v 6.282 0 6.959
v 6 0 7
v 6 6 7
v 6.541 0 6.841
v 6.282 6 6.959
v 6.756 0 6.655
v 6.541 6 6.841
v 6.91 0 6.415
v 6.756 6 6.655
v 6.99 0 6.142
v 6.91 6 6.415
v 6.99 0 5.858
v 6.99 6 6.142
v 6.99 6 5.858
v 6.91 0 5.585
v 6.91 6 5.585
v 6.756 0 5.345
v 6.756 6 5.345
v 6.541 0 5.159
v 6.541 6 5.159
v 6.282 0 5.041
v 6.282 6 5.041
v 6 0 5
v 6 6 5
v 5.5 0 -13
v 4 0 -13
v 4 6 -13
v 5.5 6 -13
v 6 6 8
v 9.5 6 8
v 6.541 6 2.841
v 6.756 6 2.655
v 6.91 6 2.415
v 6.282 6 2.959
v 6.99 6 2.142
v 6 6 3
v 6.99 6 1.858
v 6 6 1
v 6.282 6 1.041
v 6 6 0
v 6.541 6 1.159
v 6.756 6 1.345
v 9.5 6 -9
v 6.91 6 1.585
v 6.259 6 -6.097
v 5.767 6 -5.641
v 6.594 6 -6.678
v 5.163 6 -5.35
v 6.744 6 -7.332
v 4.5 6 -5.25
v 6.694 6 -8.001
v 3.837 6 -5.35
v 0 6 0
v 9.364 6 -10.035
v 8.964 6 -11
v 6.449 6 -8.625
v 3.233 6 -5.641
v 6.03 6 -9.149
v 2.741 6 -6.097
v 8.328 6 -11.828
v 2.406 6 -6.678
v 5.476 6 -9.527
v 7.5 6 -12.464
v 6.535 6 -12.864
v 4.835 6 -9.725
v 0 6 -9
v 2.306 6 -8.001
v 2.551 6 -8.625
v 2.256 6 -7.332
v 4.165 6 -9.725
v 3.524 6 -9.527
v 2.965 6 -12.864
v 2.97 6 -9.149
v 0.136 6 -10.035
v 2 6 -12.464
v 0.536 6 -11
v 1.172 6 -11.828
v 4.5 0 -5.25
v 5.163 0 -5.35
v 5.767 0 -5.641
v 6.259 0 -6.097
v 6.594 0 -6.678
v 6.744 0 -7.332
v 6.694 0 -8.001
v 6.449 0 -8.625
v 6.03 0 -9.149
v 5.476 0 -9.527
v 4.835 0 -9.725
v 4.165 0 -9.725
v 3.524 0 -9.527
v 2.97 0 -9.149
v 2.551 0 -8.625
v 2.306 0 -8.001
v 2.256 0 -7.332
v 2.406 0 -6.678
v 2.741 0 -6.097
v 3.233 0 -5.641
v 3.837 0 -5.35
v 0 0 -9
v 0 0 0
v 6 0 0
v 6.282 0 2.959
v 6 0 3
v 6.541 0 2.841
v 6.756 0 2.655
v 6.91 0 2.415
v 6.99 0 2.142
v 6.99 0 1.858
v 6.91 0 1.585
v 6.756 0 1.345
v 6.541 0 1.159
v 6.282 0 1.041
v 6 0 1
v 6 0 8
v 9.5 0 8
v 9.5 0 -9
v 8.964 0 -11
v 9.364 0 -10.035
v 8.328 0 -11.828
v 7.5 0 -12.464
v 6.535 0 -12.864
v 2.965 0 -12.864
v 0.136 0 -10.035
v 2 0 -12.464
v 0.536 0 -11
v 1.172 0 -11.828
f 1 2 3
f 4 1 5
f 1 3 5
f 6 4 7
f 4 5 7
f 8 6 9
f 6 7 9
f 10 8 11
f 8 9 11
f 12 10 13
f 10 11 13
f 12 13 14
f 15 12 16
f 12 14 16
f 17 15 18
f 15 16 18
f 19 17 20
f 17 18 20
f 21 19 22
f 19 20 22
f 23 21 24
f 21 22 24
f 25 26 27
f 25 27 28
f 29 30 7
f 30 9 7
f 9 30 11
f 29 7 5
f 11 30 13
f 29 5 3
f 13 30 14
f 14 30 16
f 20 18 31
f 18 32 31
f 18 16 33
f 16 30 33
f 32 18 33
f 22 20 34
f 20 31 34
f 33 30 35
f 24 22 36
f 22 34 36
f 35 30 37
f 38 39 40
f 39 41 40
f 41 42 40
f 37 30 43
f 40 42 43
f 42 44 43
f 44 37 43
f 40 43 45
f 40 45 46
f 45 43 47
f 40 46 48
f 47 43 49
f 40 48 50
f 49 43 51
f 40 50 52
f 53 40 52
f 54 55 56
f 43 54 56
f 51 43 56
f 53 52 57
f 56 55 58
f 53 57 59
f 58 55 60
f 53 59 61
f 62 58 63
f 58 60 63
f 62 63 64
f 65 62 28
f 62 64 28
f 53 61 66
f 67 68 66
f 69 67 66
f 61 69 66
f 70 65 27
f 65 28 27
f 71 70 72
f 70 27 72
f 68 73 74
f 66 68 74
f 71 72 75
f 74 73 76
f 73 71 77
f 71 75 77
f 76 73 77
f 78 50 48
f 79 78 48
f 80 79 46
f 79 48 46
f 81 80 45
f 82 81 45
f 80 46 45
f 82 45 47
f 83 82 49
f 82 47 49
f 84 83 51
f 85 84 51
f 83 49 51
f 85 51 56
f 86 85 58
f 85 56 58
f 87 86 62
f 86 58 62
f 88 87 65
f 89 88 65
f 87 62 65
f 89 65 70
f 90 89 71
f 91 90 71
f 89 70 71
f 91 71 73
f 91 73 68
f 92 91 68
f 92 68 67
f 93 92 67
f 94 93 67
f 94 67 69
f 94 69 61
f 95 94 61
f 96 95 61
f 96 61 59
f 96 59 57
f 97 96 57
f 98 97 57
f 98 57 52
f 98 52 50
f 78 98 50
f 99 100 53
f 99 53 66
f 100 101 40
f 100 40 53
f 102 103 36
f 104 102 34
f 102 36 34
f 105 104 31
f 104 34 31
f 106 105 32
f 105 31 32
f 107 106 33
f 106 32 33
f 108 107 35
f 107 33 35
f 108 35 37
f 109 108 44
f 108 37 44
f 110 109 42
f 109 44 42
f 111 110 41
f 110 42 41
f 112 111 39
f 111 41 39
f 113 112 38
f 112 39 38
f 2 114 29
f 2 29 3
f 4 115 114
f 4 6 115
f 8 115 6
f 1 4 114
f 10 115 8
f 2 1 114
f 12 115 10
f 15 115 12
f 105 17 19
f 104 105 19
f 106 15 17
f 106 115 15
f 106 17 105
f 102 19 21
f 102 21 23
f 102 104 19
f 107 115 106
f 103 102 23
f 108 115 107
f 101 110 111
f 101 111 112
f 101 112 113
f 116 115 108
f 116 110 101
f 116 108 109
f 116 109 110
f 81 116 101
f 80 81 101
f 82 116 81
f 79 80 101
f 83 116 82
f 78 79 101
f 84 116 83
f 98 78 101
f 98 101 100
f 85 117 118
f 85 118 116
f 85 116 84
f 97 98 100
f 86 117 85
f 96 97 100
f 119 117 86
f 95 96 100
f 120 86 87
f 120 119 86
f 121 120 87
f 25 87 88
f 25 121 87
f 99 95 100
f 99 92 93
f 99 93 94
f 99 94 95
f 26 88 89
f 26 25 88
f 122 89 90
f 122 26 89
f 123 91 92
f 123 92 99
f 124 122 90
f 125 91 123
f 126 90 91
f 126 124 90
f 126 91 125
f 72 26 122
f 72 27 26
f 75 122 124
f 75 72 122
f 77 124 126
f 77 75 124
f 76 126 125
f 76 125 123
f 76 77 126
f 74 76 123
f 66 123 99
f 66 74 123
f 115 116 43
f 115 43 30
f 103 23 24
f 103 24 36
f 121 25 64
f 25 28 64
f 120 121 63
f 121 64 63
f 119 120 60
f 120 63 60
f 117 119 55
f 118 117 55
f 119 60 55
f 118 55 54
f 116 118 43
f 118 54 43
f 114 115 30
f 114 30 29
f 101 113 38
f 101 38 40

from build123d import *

# Parameters (mm, degrees)
BOSS_EXTRUDE1_DEPTH = 6
SKETCH2_R           = 1
SKETCH2_R_2         = 2.25
CUT_EXTRUDE1_DEPTH  = 18.182840277
FILLET1_R           = 4


with BuildPart() as part:
    # Sketch1 → Boss-Extrude1 (new body)
    with BuildSketch(Plane(origin=(0, 0, 0), x_dir=(1, 0, 0), z_dir=(0, 1, 0))):
        Polygon((0, 13), (9.5, 13), (9.5, -8), (6, -8), (6, 0), (0, 0), align=None)
    extrude(amount=BOSS_EXTRUDE1_DEPTH)

    # Sketch2 → Cut-Extrude1 (cut, through all)
    with BuildSketch(Plane(origin=(0, 6, 0), x_dir=(1, 0, 0), z_dir=(0, 1, 0))):
        with Locations((6, -2)):
            Circle(SKETCH2_R)
        with Locations(Location((4.5, 7.5, 0), (0, 0, 270))):
            Circle(SKETCH2_R_2)
        with Locations((6, -6)):
            Circle(SKETCH2_R)
    extrude(amount=-CUT_EXTRUDE1_DEPTH, mode=Mode.SUBTRACT)

    # Fillet1
    fillet1_edges = [part.edges().sort_by_distance(p)[0] for p in [
        (0, 3, -13),
        (9.5, 3, -13),
    ]]
    fillet(fillet1_edges, radius=FILLET1_R)


solid = part.part
